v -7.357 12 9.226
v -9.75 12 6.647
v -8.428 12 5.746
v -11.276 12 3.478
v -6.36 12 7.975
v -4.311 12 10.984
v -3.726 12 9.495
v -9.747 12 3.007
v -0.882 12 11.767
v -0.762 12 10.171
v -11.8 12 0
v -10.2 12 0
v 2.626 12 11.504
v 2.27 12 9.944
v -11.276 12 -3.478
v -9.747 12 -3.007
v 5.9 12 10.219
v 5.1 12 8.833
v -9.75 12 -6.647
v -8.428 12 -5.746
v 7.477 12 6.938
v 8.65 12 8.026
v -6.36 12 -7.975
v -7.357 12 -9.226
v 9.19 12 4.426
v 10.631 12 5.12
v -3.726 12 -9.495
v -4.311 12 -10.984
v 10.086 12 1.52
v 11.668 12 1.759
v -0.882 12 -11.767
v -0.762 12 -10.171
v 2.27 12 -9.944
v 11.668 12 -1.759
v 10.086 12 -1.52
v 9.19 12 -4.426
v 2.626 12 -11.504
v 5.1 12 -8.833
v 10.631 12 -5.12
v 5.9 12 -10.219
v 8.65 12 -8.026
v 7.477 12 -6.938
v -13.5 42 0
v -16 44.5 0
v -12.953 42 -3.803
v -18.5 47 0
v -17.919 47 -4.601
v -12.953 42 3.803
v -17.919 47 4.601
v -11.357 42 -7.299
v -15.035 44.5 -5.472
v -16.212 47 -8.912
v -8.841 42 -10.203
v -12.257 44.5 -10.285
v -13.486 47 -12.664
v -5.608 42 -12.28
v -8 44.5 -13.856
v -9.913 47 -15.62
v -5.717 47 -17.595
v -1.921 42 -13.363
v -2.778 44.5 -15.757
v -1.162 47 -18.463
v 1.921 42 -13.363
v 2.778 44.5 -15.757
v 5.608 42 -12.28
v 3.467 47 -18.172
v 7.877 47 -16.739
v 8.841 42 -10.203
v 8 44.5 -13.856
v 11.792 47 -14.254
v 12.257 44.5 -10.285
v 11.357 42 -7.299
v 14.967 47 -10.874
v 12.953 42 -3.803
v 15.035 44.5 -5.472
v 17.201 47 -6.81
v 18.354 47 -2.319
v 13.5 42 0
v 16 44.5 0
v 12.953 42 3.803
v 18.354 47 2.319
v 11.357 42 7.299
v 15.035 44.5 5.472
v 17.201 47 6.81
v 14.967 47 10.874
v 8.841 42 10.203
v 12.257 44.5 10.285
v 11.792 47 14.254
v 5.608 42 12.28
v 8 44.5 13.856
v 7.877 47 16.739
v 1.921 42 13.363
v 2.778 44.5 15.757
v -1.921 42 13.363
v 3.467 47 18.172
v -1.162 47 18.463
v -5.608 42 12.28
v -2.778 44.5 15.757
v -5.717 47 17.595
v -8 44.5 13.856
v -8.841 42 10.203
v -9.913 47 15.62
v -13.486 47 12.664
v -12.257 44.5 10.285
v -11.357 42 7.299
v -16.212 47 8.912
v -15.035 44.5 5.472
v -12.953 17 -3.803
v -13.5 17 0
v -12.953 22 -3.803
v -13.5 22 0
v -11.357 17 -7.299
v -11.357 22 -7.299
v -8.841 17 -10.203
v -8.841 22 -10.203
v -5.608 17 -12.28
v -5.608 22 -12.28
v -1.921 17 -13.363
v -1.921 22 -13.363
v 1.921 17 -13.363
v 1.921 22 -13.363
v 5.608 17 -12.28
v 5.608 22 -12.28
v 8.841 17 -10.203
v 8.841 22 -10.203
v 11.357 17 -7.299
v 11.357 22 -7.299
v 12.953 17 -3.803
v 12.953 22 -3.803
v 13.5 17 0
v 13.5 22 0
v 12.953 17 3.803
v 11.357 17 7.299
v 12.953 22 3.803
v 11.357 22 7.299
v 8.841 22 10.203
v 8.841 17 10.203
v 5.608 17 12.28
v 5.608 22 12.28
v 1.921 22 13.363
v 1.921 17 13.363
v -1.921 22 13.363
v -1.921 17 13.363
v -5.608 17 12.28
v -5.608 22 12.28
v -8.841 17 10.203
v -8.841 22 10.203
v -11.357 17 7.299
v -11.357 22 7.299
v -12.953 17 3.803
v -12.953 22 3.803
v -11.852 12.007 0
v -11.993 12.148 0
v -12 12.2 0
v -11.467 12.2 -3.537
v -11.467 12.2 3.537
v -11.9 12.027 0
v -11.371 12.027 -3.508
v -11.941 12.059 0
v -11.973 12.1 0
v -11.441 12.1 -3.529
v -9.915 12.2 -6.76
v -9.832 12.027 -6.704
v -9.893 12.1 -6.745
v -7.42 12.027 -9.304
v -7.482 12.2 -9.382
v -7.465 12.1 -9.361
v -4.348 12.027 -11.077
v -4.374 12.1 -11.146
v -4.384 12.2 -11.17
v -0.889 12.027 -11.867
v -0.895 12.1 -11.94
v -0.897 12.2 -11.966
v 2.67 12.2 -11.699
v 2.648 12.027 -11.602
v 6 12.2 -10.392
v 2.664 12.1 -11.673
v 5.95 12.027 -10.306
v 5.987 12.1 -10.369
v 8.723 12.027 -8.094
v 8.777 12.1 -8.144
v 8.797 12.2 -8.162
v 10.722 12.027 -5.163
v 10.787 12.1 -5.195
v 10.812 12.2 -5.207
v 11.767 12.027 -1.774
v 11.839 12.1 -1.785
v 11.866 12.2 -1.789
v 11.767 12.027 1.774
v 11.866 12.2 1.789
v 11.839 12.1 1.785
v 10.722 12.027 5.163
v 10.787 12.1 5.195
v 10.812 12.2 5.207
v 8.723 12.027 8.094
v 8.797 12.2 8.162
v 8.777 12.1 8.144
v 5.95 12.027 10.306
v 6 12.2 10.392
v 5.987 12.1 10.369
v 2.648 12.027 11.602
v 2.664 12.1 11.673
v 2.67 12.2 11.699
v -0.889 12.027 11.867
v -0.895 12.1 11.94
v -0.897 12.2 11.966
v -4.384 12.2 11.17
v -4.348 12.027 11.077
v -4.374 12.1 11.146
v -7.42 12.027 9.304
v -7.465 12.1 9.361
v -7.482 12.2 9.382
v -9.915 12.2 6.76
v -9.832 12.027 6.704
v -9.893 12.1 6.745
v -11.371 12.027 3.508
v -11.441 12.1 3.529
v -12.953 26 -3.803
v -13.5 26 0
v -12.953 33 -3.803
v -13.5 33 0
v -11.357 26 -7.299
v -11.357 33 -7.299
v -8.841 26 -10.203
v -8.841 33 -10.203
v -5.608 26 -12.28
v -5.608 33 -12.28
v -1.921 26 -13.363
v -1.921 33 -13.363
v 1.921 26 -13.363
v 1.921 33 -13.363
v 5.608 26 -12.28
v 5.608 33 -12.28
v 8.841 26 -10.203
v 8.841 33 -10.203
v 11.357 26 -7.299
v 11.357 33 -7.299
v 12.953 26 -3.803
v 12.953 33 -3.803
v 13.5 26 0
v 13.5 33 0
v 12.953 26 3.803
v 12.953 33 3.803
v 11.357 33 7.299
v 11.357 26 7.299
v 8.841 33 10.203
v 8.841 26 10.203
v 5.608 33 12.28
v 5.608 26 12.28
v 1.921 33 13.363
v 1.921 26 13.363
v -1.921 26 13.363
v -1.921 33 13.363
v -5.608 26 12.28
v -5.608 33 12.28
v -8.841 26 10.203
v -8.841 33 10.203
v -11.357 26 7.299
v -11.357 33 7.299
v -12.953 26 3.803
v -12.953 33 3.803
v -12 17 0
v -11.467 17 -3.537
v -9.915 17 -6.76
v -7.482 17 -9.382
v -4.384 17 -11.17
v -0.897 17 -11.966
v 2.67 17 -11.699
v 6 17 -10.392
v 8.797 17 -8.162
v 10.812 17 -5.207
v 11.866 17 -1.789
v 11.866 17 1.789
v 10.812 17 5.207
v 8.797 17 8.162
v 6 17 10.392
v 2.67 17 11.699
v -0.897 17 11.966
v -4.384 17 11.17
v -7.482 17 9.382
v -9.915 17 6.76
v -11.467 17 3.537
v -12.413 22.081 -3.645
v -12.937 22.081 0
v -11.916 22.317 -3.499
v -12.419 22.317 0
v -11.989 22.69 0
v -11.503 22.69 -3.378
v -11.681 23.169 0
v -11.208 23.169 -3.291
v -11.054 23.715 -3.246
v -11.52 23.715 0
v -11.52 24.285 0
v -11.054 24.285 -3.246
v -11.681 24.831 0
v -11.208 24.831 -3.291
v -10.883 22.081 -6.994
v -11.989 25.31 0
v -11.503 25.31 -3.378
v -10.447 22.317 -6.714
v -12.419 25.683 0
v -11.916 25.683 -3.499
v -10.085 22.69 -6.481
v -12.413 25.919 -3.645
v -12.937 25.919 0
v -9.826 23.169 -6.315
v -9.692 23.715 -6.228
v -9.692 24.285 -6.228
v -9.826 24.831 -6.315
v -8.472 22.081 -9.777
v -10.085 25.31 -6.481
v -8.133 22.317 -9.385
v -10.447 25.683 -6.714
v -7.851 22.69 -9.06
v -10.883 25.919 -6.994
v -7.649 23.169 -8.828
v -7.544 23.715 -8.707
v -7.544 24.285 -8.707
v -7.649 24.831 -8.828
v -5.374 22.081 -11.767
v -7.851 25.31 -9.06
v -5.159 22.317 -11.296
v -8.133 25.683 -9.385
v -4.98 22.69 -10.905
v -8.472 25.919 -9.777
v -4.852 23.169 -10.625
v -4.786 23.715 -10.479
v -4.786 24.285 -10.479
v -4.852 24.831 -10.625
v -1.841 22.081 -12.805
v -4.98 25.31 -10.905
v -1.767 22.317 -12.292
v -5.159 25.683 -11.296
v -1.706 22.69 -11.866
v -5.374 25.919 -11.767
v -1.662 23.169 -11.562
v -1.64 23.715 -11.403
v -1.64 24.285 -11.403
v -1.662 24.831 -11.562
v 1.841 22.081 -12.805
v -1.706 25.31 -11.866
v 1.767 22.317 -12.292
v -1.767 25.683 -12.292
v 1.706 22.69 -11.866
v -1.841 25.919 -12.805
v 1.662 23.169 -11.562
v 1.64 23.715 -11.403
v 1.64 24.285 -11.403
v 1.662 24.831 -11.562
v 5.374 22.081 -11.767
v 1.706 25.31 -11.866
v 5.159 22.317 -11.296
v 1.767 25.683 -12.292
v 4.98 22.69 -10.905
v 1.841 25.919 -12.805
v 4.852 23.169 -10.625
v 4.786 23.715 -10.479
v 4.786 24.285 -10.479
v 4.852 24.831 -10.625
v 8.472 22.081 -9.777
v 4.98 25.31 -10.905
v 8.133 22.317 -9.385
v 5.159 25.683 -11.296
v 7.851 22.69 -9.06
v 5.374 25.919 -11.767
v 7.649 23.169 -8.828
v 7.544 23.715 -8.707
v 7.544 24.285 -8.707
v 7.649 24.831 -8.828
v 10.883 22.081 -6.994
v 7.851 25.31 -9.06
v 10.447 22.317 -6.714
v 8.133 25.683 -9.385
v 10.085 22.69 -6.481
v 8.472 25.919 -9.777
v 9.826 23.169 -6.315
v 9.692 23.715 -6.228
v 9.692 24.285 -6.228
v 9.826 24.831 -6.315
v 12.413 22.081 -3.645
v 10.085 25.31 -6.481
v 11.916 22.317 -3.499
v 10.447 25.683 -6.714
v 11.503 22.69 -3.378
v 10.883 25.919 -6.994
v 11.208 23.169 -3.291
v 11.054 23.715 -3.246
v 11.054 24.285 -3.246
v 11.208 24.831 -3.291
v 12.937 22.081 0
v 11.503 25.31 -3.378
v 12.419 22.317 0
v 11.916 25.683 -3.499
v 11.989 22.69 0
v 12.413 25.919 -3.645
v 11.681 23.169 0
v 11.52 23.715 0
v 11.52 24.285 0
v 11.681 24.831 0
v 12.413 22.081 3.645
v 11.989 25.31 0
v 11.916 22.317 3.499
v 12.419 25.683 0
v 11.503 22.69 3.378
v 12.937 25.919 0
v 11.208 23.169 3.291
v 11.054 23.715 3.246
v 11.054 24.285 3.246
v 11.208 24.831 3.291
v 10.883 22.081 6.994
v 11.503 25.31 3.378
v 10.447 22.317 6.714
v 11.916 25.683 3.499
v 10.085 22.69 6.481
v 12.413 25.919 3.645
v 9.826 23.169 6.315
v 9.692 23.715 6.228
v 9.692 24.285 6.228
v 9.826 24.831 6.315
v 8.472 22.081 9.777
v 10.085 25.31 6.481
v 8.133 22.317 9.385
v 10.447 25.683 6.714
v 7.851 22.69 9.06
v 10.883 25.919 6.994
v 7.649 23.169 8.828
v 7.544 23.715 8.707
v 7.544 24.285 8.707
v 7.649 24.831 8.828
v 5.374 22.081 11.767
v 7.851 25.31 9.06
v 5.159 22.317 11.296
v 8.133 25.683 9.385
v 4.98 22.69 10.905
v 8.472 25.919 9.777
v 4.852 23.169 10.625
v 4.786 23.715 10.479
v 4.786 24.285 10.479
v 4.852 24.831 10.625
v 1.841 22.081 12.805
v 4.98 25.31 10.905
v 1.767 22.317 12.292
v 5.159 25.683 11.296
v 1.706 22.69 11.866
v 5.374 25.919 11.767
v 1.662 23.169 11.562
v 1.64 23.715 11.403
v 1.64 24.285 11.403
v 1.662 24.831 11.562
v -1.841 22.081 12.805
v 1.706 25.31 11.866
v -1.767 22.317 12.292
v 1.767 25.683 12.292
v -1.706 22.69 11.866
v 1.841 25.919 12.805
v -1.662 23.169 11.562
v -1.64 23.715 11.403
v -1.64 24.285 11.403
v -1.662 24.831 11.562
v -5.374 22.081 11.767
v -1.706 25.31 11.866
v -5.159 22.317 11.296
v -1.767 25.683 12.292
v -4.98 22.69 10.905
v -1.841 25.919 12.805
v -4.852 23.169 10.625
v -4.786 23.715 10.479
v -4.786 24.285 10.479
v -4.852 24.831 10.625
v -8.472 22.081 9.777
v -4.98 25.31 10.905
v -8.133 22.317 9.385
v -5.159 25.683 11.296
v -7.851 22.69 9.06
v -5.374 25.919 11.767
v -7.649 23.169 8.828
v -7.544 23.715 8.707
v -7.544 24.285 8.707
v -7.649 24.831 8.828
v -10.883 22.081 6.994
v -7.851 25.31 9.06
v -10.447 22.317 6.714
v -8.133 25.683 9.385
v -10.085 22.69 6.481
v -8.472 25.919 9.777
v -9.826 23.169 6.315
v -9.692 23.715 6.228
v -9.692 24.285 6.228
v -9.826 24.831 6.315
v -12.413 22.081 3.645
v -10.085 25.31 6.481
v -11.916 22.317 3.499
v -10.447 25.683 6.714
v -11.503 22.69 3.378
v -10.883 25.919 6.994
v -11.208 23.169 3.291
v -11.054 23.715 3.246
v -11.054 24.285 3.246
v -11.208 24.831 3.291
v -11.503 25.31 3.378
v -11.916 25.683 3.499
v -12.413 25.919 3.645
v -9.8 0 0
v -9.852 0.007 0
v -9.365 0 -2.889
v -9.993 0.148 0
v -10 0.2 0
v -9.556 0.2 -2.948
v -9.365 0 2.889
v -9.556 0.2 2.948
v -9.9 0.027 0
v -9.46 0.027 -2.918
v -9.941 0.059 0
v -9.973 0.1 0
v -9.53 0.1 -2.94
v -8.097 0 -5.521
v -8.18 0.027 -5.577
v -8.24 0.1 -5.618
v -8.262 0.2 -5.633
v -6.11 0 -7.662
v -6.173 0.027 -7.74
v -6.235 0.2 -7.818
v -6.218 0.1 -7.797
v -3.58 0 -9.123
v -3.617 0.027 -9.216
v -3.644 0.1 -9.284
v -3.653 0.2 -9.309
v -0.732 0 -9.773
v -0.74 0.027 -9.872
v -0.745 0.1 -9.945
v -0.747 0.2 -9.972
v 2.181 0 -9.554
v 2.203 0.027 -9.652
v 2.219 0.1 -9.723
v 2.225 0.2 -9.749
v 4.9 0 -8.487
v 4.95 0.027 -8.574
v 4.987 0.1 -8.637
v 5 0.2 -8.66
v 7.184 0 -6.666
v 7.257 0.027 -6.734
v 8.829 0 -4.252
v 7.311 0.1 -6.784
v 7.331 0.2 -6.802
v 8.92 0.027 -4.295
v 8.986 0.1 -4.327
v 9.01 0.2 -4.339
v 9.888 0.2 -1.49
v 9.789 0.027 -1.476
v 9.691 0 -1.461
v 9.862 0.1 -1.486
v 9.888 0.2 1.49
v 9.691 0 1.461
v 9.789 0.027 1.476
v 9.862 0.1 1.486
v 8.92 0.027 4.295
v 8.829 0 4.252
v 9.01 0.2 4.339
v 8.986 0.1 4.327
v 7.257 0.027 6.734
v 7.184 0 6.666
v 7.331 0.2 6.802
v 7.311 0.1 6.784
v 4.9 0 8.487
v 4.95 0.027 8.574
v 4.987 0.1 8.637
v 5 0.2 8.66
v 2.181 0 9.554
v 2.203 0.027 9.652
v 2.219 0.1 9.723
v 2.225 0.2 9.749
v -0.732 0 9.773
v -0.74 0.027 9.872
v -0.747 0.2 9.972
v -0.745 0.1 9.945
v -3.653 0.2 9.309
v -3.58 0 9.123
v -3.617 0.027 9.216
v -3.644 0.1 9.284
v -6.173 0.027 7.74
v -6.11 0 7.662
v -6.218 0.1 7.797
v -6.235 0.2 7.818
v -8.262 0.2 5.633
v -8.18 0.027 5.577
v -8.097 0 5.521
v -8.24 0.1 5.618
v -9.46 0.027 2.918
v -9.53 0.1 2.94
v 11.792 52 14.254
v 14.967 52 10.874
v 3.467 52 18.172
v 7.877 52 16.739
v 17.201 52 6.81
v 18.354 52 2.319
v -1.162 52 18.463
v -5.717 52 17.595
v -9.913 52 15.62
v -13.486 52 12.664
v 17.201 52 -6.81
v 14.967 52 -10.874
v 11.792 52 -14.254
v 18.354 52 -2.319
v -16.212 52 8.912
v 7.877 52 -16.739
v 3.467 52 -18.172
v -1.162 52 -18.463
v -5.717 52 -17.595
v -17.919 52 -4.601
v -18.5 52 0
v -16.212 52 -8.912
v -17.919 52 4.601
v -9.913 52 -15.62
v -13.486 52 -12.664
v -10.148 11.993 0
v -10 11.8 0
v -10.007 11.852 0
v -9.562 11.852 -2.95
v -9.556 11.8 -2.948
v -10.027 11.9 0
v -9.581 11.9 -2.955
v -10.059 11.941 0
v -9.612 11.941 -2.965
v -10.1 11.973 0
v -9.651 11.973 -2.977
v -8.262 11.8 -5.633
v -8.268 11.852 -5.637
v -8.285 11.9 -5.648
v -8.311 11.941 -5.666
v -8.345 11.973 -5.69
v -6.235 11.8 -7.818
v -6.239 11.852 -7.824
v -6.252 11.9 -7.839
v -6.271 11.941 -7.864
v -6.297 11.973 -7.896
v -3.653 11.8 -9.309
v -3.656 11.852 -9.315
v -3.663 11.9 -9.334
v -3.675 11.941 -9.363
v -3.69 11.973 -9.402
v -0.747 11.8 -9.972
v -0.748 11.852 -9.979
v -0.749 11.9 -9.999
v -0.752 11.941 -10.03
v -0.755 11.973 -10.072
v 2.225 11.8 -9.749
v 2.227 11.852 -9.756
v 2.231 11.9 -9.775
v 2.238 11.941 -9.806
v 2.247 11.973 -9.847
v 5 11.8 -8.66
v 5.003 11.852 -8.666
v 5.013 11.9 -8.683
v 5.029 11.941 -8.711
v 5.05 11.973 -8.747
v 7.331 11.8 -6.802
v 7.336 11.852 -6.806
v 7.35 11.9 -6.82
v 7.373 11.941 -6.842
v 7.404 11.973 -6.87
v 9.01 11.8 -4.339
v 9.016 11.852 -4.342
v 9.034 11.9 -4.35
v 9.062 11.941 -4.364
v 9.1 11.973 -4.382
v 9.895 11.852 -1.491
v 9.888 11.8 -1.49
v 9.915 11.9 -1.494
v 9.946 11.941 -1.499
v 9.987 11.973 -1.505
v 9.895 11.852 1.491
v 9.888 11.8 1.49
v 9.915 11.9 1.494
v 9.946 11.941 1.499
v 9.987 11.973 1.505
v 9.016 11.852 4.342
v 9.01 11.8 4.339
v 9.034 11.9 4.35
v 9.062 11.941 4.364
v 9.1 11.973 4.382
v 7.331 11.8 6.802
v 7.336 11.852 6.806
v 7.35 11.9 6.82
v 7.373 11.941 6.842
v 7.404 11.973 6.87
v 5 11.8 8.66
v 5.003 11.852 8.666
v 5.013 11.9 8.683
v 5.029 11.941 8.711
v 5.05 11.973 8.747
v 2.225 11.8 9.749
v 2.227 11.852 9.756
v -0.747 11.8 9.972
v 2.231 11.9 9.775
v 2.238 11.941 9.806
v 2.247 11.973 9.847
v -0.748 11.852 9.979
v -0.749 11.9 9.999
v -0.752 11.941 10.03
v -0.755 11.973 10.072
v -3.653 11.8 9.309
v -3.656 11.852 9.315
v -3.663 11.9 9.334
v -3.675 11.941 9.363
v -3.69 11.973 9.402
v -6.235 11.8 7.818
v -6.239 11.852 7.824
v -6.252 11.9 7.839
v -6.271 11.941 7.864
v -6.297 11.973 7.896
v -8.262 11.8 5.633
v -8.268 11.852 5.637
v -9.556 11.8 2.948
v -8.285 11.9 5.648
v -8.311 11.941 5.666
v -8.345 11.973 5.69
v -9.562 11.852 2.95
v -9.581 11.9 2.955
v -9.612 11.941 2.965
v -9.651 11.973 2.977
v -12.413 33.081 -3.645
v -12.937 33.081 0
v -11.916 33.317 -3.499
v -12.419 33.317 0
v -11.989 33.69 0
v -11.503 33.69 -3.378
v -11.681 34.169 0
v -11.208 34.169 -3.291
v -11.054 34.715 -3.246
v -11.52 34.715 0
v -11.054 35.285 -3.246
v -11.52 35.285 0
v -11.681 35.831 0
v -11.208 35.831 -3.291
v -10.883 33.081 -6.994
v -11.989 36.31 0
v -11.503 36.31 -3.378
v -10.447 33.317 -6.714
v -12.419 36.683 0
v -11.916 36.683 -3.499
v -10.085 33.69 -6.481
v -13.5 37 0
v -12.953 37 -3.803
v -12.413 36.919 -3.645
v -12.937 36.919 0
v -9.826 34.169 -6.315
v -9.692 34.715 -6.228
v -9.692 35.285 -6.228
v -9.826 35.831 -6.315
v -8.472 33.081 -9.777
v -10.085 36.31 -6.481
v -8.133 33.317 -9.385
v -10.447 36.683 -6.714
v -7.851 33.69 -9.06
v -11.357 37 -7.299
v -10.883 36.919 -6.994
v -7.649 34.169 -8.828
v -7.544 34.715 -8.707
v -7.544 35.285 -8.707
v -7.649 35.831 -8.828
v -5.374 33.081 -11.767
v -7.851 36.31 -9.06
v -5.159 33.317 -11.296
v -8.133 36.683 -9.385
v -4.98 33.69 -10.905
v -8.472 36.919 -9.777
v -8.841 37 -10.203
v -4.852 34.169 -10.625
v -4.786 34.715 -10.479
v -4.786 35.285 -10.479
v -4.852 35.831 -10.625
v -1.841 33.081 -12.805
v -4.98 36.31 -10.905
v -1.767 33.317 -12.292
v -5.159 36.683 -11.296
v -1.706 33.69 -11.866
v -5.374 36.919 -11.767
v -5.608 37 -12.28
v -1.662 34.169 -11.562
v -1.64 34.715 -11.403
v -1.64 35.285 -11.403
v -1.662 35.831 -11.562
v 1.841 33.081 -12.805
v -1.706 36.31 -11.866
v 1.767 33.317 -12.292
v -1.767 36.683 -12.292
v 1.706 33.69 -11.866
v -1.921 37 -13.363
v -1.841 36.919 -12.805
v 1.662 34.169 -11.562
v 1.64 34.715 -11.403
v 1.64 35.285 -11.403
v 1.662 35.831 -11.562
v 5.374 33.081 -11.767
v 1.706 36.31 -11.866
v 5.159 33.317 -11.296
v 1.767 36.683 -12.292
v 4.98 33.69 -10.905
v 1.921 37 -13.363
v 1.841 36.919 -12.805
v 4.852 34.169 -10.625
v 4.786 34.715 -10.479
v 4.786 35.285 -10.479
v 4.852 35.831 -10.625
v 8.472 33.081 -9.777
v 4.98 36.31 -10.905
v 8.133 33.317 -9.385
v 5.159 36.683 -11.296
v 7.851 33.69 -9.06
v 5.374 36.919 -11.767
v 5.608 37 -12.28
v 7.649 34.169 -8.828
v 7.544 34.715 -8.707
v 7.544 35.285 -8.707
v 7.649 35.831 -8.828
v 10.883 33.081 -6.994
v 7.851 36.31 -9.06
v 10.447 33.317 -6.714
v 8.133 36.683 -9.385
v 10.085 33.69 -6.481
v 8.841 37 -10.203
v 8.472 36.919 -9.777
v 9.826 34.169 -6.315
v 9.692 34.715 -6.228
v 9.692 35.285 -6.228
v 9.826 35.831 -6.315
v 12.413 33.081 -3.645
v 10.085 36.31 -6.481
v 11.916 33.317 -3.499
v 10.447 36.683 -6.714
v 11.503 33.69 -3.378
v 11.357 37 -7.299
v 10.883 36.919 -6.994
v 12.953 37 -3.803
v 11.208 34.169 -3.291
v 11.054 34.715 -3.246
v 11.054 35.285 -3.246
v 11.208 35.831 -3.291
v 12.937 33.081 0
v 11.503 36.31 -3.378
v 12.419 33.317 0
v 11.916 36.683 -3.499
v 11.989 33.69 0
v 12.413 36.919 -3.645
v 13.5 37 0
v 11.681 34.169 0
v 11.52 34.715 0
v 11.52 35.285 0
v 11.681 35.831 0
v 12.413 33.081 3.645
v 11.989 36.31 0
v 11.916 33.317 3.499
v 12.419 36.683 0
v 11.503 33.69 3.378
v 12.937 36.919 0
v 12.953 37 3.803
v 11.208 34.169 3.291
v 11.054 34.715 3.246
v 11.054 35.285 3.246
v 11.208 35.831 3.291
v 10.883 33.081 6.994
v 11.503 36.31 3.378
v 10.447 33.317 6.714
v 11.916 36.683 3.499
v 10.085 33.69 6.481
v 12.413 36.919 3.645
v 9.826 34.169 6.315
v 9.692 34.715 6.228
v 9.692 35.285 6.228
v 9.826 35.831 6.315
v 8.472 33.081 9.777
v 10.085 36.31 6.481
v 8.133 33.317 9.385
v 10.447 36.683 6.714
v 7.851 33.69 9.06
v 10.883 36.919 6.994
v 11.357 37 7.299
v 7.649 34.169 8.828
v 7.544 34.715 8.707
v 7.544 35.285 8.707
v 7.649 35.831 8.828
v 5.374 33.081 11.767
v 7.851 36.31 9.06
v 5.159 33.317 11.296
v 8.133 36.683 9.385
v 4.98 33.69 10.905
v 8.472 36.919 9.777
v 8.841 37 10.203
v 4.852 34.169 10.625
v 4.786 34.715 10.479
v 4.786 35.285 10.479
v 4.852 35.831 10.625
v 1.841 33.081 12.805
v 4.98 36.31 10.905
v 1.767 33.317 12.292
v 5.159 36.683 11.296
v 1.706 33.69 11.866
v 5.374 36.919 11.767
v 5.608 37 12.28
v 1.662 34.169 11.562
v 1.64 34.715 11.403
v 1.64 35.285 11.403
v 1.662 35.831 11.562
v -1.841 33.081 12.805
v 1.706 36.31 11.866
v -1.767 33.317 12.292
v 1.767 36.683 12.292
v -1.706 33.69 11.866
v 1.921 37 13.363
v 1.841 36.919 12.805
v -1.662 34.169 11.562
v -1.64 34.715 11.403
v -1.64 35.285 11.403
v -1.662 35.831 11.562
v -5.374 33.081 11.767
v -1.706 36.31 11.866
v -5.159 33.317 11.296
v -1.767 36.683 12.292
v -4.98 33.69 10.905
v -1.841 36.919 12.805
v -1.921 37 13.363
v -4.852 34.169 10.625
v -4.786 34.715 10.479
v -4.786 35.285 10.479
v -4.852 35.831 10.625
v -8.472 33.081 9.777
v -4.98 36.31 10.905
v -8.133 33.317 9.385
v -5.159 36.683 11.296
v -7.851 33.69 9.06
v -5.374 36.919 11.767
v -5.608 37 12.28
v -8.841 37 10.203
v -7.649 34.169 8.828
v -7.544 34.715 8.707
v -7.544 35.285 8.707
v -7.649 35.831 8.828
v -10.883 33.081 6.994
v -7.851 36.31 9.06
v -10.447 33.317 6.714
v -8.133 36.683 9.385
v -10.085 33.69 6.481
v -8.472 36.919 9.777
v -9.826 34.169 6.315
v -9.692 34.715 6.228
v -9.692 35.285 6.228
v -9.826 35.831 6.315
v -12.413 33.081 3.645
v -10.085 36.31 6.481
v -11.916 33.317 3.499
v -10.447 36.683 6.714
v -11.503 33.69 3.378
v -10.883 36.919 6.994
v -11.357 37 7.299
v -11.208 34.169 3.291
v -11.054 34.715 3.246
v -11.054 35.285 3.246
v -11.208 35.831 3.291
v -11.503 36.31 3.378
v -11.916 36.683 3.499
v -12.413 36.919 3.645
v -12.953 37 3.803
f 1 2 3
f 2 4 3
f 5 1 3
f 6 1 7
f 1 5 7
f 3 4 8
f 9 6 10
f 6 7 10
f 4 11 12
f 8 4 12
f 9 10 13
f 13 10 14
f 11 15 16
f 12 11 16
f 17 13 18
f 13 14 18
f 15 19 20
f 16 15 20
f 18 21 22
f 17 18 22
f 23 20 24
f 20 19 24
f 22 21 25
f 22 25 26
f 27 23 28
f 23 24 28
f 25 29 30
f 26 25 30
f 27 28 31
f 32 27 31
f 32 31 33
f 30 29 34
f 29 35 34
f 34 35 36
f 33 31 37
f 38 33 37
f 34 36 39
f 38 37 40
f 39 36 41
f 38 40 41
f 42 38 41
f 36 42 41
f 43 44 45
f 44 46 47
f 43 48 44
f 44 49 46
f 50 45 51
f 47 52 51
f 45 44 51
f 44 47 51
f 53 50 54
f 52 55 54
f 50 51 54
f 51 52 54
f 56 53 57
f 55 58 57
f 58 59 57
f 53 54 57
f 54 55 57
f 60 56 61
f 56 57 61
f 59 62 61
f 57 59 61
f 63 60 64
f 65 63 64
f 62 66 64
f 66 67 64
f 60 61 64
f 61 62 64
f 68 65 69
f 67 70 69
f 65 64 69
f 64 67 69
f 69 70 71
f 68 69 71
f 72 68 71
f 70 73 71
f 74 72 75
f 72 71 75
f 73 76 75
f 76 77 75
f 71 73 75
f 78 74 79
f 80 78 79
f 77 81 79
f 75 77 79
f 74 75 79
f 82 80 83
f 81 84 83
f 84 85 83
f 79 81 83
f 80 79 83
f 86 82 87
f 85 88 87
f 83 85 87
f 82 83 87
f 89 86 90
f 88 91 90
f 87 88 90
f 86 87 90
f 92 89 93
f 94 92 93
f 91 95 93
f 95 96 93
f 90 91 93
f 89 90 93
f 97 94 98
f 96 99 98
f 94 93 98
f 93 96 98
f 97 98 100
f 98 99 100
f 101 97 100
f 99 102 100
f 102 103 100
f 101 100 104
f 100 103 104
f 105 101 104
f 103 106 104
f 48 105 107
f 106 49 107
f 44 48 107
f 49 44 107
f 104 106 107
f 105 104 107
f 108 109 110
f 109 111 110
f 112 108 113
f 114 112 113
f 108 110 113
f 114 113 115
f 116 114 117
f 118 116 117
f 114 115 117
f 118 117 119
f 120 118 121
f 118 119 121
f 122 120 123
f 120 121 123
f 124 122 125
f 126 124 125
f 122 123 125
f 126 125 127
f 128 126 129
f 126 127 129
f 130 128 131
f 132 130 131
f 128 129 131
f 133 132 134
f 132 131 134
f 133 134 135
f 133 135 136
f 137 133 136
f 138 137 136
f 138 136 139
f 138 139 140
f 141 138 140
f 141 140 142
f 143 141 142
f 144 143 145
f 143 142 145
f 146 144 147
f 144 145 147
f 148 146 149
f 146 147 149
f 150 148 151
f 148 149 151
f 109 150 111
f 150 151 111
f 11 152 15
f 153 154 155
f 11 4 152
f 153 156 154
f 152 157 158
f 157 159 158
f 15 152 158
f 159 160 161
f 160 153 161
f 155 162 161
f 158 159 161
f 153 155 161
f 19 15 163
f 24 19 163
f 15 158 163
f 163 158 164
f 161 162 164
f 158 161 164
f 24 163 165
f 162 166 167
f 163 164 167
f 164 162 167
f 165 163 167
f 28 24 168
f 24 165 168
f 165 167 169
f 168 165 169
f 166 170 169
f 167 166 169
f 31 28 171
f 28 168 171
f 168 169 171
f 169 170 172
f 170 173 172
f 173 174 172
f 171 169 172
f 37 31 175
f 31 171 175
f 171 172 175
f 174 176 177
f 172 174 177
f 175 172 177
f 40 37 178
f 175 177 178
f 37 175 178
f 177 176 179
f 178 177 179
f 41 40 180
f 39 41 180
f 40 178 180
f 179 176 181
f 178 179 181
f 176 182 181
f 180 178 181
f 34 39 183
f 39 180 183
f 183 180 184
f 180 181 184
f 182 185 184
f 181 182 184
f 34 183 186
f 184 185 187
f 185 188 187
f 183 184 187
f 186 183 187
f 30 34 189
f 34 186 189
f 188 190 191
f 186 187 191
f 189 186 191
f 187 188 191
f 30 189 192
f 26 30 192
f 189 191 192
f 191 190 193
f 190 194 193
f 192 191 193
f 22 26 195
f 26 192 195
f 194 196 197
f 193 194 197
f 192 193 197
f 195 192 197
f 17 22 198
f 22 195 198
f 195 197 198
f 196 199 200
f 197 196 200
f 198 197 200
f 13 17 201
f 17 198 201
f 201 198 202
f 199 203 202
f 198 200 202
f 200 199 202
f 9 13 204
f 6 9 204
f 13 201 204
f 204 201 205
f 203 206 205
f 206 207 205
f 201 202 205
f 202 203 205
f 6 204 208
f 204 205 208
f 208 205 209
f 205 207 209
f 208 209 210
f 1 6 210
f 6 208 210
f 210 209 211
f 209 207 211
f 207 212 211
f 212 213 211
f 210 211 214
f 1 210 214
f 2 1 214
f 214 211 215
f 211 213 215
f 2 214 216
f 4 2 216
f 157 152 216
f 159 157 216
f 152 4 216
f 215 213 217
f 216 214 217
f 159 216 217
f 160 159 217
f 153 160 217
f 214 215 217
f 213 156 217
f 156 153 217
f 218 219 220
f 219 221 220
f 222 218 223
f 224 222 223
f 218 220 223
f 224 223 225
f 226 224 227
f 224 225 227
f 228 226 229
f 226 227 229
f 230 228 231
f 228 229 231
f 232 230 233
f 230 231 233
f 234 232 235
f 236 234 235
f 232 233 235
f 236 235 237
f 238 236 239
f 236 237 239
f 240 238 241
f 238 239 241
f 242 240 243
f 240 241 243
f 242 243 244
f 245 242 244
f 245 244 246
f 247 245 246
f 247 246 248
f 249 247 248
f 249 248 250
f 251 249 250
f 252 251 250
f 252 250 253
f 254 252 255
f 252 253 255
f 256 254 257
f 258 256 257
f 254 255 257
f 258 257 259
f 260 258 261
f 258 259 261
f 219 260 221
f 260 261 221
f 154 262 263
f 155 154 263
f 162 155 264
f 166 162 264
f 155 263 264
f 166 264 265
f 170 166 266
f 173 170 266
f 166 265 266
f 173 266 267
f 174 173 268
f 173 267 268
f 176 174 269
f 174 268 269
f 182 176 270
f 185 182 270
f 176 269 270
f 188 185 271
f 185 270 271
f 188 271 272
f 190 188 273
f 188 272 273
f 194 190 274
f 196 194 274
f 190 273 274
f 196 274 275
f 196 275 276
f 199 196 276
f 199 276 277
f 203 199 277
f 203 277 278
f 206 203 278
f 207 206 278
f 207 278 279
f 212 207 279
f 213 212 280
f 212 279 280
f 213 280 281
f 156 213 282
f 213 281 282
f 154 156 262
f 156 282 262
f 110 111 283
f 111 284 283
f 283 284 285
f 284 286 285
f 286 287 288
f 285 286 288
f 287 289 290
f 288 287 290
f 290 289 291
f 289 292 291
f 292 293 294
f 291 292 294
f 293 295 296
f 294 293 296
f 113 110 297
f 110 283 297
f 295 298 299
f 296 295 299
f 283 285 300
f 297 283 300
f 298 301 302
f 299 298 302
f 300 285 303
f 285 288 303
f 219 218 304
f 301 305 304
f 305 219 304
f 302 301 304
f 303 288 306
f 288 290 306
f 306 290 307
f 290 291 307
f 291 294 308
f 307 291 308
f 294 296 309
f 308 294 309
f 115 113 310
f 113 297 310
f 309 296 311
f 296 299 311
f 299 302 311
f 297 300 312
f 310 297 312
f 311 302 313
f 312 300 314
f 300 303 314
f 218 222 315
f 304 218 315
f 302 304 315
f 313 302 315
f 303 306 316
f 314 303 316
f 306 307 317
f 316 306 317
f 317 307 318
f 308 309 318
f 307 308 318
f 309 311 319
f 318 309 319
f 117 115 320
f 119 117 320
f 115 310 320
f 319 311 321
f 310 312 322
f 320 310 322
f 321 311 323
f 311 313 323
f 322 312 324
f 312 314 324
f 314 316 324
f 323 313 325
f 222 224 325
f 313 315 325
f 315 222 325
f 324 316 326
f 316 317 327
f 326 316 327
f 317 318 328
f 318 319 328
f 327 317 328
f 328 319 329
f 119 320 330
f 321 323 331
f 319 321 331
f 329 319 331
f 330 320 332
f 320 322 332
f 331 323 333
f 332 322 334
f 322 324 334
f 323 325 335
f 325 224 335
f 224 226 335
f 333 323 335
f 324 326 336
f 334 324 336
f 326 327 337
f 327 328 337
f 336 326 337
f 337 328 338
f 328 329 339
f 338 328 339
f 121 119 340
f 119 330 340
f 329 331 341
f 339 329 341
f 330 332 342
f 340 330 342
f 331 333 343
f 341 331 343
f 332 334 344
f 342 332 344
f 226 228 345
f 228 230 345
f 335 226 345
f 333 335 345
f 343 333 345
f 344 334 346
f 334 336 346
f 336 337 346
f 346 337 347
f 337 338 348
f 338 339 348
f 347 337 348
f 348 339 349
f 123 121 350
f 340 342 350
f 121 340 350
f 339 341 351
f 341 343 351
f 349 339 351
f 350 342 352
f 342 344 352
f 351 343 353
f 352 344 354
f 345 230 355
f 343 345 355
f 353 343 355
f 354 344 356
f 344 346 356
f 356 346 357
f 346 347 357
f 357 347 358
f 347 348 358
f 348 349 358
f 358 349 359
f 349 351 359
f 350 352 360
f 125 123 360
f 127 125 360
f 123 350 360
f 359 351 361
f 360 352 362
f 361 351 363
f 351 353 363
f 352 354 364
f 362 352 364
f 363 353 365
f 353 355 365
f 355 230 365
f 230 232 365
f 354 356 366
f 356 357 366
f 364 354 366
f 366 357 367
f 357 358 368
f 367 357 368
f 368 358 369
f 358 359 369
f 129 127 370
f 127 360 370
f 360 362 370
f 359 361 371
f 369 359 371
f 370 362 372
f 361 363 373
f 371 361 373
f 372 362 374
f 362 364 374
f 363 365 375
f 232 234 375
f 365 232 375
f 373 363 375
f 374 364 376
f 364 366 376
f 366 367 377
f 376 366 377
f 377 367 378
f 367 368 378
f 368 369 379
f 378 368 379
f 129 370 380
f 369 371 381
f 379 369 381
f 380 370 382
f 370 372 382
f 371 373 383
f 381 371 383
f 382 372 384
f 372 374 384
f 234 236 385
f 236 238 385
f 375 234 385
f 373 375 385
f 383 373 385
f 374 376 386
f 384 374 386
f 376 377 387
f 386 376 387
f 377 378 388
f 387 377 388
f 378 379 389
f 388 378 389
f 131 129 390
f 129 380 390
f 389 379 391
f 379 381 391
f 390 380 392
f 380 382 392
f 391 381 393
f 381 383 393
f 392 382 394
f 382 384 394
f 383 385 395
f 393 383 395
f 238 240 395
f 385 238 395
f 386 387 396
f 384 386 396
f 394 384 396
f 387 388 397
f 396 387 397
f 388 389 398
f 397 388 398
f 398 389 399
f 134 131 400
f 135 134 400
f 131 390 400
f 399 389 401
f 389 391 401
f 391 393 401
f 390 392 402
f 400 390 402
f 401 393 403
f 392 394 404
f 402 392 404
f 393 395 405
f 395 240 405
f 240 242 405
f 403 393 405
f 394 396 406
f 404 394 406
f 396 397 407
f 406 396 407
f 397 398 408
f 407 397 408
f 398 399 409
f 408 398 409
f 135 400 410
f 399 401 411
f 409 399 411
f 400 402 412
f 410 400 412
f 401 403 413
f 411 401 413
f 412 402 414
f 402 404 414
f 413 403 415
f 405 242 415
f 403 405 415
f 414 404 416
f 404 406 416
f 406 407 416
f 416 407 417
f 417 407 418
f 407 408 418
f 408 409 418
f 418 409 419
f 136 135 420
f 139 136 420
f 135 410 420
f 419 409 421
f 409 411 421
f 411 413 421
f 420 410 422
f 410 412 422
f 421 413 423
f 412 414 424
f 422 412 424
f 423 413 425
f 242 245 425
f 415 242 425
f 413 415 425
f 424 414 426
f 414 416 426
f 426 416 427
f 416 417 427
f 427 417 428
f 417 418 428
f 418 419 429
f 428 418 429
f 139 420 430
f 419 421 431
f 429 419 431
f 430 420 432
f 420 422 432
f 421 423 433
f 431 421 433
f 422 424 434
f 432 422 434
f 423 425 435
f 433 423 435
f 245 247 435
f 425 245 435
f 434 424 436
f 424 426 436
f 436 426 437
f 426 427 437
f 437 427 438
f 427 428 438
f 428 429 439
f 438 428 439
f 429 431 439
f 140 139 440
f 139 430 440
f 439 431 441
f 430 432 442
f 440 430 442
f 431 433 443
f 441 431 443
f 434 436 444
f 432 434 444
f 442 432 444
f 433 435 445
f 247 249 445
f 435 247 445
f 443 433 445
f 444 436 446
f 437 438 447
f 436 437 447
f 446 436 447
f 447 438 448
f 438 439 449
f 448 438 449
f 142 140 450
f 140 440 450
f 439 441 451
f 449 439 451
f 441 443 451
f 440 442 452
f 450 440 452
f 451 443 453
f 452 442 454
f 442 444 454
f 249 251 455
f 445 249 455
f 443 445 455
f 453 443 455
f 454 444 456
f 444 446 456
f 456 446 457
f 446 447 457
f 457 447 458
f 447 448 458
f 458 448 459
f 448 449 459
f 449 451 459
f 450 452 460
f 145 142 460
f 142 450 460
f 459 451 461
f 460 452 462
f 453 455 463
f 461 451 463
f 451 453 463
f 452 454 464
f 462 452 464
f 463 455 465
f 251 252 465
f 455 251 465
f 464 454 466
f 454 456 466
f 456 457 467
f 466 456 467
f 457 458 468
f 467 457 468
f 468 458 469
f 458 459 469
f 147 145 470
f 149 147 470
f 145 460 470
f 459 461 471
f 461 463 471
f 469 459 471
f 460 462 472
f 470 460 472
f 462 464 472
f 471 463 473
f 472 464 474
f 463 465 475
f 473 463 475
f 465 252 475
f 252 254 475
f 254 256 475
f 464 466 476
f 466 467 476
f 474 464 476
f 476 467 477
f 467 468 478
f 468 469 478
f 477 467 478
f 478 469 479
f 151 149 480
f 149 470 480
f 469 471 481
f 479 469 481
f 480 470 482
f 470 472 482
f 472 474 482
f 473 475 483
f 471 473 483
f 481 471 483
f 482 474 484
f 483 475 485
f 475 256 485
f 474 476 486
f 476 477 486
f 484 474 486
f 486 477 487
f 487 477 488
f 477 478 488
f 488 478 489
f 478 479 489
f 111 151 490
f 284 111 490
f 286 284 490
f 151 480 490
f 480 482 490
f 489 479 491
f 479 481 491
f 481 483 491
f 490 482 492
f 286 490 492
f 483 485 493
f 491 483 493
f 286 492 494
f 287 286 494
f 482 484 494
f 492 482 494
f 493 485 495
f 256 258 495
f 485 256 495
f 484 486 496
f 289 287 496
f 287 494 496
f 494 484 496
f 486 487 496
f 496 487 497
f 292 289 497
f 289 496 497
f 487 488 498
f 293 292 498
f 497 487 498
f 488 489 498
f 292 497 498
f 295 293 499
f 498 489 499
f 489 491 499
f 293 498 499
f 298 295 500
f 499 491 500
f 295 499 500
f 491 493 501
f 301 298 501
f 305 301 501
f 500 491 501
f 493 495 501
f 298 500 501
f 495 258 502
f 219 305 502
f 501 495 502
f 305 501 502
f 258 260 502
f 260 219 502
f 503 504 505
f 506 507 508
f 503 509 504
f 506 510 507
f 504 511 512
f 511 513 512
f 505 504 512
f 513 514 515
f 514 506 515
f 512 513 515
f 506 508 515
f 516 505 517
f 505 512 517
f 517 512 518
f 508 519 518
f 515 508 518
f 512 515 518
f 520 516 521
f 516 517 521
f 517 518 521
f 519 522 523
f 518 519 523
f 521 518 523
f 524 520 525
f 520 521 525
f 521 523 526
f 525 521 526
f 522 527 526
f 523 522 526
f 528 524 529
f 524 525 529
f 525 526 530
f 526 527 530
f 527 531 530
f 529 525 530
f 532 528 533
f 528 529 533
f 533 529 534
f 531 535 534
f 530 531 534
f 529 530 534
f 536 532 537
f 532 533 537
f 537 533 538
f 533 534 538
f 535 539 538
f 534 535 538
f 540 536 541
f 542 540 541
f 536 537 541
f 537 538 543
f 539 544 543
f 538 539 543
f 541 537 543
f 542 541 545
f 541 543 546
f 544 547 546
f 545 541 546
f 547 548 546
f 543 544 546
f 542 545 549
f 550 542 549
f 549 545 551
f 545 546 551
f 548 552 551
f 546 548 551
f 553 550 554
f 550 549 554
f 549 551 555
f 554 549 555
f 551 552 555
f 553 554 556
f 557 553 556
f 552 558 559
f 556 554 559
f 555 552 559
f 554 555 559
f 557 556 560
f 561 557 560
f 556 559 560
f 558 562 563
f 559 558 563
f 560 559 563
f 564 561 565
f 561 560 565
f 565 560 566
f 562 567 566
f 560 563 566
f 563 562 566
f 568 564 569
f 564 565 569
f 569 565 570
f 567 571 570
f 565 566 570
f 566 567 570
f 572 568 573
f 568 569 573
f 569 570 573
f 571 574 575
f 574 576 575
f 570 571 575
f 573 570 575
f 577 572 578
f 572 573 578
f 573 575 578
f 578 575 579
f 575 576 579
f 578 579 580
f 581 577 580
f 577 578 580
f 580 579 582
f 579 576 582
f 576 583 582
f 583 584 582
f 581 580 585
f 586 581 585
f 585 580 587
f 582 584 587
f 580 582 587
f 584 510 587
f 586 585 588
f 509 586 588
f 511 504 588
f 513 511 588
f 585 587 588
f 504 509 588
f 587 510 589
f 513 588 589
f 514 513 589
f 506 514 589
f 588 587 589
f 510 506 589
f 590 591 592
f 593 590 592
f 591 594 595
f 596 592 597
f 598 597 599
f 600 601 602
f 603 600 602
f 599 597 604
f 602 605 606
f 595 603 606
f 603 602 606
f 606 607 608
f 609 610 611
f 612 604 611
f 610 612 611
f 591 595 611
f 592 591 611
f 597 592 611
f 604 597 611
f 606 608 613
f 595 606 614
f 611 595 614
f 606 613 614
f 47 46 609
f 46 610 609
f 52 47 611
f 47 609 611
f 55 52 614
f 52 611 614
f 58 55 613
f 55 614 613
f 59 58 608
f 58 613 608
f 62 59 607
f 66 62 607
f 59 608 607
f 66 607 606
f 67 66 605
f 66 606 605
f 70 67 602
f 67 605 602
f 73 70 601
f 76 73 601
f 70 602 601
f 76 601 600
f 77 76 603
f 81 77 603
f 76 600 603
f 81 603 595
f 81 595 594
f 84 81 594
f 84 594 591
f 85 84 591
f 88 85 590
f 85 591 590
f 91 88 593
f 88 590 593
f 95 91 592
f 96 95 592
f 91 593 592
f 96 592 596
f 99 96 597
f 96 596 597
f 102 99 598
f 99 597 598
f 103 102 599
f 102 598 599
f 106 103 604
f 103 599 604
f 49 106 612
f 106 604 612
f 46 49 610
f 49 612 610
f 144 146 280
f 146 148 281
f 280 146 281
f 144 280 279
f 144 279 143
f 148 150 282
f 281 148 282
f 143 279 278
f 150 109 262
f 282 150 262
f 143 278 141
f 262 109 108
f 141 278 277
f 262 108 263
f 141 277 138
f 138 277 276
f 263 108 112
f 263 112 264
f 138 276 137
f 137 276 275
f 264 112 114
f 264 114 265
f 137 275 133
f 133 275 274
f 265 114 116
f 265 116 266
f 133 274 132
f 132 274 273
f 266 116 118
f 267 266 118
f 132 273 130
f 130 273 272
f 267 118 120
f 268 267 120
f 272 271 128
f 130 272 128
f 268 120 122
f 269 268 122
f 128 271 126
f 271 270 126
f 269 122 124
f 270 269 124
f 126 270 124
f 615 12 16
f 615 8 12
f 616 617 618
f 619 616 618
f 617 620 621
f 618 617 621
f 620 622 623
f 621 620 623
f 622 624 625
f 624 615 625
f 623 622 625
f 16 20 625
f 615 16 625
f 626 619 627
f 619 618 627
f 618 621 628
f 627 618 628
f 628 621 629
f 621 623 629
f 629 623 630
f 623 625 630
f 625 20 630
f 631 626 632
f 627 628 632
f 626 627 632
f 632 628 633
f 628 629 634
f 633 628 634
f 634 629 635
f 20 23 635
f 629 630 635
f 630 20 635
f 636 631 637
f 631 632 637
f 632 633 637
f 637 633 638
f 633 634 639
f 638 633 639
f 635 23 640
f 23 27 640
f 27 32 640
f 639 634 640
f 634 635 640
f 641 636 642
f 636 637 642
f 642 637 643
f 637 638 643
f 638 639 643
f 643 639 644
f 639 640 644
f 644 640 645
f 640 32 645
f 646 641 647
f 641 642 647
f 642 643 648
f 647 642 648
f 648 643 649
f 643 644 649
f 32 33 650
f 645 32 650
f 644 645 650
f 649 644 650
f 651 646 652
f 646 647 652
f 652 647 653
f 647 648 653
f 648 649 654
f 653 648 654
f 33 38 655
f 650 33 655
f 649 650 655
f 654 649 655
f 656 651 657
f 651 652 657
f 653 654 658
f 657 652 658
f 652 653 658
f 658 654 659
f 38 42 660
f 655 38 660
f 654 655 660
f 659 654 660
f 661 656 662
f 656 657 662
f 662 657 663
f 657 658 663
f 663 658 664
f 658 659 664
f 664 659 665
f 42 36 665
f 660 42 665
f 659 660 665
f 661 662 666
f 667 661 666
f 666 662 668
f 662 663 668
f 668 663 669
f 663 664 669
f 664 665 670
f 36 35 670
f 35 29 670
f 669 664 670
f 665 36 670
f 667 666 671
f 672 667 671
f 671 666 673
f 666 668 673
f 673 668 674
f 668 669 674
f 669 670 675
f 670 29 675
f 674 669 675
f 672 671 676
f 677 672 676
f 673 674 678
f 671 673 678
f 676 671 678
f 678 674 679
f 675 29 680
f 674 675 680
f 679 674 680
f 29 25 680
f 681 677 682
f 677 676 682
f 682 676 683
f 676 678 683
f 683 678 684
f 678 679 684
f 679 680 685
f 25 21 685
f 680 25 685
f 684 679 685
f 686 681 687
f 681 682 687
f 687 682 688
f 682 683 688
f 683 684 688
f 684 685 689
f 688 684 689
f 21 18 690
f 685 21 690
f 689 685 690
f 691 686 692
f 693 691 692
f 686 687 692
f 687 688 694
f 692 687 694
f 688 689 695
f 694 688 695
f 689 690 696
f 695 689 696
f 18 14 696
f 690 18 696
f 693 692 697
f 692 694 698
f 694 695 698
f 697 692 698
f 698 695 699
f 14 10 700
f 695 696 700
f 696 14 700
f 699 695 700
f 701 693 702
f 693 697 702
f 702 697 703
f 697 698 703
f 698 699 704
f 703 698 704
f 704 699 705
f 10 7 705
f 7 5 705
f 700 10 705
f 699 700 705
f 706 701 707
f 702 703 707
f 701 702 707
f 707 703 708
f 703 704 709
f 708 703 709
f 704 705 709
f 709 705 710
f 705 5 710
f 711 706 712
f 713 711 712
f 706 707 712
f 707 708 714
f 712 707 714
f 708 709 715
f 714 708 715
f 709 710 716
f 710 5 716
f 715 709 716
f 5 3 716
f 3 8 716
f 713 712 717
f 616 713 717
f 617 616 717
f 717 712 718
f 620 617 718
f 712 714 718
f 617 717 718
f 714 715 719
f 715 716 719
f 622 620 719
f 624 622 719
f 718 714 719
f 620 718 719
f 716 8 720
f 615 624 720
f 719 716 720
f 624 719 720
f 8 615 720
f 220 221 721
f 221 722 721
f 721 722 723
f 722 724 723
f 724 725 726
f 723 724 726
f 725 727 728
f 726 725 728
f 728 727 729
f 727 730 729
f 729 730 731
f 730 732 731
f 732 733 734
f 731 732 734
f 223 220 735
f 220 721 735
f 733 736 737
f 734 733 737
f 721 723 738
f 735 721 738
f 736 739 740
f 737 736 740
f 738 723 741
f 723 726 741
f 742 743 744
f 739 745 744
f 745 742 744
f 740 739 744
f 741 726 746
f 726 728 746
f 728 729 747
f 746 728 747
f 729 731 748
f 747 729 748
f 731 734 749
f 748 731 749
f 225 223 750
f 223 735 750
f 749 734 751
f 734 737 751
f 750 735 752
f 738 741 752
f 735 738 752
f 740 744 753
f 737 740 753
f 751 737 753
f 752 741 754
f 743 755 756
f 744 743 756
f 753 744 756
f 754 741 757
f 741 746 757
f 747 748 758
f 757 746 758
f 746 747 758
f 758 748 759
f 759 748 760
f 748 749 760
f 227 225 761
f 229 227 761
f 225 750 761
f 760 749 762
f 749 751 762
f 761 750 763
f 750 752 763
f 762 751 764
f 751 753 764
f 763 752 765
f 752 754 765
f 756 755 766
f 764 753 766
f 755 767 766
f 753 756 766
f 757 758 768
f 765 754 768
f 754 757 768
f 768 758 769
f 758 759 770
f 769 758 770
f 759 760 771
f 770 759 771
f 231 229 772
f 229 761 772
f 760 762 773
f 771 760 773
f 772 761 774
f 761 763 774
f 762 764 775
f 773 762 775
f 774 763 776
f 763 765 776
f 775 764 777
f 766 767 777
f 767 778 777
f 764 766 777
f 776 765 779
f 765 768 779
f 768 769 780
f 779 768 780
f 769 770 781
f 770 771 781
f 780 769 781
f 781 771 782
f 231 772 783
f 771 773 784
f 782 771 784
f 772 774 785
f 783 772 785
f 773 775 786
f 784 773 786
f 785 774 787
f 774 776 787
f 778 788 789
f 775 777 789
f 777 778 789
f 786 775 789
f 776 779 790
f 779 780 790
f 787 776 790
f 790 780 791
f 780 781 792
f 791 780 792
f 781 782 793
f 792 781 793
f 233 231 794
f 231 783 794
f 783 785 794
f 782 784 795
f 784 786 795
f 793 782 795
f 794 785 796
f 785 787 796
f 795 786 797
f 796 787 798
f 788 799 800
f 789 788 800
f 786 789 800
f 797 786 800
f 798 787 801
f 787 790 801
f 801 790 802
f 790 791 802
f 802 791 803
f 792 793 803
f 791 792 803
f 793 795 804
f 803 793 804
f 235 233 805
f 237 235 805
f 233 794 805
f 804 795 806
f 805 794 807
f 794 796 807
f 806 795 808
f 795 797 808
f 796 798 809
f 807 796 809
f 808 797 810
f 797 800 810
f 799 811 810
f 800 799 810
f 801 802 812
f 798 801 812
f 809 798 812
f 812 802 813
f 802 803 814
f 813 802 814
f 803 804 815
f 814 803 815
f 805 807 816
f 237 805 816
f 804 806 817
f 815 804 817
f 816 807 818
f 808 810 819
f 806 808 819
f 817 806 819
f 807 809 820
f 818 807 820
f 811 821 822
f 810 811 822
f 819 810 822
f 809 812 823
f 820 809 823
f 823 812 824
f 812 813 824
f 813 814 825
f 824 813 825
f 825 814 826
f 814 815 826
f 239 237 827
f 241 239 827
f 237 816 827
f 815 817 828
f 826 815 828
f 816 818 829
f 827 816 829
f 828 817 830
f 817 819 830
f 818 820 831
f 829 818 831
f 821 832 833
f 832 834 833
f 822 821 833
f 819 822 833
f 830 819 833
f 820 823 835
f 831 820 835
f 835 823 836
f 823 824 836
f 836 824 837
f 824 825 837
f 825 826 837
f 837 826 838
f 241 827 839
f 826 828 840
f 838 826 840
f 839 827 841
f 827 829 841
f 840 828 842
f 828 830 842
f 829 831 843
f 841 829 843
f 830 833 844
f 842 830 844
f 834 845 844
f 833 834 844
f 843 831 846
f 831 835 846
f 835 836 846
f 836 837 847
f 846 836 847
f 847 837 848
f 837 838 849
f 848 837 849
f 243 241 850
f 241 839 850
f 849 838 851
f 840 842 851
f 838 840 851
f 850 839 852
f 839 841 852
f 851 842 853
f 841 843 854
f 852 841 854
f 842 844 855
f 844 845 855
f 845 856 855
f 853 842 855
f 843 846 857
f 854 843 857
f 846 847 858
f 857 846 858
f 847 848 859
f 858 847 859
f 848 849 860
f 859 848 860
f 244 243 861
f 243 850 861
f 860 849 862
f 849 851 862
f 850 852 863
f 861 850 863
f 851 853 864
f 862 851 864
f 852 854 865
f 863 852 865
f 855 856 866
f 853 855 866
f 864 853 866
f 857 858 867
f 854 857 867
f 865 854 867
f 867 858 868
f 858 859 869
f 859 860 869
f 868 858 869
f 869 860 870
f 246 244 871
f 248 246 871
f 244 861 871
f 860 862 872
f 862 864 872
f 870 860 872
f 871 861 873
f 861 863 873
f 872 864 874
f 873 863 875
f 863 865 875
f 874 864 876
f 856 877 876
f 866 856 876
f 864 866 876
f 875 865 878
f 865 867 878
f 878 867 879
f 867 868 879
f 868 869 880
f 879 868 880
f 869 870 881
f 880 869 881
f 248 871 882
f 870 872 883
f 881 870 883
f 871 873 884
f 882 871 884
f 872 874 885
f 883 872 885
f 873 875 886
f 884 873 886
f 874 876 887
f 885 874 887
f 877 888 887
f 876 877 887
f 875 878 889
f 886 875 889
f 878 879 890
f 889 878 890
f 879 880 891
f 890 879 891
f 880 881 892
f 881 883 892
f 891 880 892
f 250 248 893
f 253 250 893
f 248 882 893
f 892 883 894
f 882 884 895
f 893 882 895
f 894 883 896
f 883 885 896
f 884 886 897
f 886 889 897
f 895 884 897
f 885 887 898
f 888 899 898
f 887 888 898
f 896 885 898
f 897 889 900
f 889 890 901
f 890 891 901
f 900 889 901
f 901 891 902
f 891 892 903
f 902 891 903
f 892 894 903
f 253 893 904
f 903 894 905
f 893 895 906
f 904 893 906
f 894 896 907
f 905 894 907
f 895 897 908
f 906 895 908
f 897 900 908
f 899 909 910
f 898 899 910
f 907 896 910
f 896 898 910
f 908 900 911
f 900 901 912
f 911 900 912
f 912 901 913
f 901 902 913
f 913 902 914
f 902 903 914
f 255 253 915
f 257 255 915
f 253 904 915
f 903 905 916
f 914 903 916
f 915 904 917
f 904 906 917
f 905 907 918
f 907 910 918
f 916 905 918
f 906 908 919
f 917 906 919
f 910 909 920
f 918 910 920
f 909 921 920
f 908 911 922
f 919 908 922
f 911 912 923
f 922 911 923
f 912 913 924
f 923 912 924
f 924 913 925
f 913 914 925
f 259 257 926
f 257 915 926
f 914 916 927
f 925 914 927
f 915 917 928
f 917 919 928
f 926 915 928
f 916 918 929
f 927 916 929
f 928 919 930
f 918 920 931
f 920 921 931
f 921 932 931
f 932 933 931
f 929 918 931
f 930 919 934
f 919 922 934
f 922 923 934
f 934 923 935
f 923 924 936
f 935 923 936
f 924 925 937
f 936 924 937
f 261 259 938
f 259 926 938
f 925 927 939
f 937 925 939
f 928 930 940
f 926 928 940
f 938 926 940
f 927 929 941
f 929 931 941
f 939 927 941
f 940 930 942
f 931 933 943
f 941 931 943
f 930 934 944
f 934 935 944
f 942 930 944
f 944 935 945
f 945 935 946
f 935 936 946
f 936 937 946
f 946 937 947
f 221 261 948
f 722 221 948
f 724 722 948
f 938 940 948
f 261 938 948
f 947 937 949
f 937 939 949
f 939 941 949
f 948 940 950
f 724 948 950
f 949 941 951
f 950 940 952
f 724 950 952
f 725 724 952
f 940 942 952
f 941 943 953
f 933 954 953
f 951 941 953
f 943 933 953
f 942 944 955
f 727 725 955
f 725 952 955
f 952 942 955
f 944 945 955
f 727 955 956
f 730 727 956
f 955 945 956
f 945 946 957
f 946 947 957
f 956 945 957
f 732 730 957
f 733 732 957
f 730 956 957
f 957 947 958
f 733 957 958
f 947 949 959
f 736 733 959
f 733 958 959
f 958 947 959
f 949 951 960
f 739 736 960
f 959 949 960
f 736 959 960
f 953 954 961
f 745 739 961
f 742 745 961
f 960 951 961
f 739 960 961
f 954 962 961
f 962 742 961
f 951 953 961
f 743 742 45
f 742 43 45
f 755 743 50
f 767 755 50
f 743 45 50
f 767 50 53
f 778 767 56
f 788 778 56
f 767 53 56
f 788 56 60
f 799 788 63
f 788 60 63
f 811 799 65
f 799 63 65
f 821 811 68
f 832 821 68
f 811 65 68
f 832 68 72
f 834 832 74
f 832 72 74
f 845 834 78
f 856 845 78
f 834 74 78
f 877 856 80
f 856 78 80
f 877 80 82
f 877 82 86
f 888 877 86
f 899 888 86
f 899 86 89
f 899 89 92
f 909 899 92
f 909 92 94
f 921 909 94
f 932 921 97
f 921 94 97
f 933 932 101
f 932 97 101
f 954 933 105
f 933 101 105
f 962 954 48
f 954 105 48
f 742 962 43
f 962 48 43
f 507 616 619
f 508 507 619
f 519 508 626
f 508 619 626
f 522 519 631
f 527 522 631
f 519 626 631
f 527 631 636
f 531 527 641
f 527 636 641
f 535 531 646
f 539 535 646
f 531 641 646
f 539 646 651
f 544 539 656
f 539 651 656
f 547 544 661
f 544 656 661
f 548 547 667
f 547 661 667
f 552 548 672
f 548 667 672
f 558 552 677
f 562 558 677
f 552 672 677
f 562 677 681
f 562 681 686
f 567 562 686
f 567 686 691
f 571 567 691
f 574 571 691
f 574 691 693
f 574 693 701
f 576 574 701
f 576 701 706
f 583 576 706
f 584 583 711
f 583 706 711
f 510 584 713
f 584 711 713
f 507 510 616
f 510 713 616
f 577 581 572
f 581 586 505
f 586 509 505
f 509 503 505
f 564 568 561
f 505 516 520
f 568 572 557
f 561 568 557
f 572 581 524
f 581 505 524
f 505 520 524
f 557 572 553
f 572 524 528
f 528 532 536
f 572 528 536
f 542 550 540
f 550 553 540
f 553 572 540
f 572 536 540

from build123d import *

# Parameters (mm, degrees)
CONG_3_R = 0.2


with BuildPart() as part:
    # Esquisse1 → Révolution1 (revolve)
    with BuildSketch(Plane.XY):
        with BuildLine():
            Line((0, 0), (-7.5, 0))
            Line((-7.5, 0), (-10, 0))
            Line((-10, 0), (-10, 12))
            Line((-10, 12), (-12, 12))
            Line((-12, 12), (-12, 17))
            Line((-12, 17), (-13.5, 17))
            Line((-13.5, 17), (-13.5, 22))
            ThreePointArc((-13.5, 22), (-11.5, 24), (-13.5, 26))
            Line((-13.5, 26), (-13.5, 33))
            ThreePointArc((-13.5, 33), (-11.5, 35), (-13.5, 37))
            Line((-13.5, 37), (-13.5, 42))
            Line((-13.5, 42), (-18.5, 47))
            Line((-18.5, 47), (-18.5, 52))
            Line((-18.5, 52), (0, 52))
            Line((0, 52), (0, 42))
            Line((0, 42), (0, 0))
        make_face()
    revolve(axis=Axis((0, 42, 0), (0, -1, 0)))

    # Congé3
    cong_3_edges = [part.edges().sort_by_distance(p)[0] for p in [
        (12, 12, 0),
        (10, 12, 0),
        (10, 0, 0),
    ]]
    fillet(cong_3_edges, radius=CONG_3_R)


solid = part.part
